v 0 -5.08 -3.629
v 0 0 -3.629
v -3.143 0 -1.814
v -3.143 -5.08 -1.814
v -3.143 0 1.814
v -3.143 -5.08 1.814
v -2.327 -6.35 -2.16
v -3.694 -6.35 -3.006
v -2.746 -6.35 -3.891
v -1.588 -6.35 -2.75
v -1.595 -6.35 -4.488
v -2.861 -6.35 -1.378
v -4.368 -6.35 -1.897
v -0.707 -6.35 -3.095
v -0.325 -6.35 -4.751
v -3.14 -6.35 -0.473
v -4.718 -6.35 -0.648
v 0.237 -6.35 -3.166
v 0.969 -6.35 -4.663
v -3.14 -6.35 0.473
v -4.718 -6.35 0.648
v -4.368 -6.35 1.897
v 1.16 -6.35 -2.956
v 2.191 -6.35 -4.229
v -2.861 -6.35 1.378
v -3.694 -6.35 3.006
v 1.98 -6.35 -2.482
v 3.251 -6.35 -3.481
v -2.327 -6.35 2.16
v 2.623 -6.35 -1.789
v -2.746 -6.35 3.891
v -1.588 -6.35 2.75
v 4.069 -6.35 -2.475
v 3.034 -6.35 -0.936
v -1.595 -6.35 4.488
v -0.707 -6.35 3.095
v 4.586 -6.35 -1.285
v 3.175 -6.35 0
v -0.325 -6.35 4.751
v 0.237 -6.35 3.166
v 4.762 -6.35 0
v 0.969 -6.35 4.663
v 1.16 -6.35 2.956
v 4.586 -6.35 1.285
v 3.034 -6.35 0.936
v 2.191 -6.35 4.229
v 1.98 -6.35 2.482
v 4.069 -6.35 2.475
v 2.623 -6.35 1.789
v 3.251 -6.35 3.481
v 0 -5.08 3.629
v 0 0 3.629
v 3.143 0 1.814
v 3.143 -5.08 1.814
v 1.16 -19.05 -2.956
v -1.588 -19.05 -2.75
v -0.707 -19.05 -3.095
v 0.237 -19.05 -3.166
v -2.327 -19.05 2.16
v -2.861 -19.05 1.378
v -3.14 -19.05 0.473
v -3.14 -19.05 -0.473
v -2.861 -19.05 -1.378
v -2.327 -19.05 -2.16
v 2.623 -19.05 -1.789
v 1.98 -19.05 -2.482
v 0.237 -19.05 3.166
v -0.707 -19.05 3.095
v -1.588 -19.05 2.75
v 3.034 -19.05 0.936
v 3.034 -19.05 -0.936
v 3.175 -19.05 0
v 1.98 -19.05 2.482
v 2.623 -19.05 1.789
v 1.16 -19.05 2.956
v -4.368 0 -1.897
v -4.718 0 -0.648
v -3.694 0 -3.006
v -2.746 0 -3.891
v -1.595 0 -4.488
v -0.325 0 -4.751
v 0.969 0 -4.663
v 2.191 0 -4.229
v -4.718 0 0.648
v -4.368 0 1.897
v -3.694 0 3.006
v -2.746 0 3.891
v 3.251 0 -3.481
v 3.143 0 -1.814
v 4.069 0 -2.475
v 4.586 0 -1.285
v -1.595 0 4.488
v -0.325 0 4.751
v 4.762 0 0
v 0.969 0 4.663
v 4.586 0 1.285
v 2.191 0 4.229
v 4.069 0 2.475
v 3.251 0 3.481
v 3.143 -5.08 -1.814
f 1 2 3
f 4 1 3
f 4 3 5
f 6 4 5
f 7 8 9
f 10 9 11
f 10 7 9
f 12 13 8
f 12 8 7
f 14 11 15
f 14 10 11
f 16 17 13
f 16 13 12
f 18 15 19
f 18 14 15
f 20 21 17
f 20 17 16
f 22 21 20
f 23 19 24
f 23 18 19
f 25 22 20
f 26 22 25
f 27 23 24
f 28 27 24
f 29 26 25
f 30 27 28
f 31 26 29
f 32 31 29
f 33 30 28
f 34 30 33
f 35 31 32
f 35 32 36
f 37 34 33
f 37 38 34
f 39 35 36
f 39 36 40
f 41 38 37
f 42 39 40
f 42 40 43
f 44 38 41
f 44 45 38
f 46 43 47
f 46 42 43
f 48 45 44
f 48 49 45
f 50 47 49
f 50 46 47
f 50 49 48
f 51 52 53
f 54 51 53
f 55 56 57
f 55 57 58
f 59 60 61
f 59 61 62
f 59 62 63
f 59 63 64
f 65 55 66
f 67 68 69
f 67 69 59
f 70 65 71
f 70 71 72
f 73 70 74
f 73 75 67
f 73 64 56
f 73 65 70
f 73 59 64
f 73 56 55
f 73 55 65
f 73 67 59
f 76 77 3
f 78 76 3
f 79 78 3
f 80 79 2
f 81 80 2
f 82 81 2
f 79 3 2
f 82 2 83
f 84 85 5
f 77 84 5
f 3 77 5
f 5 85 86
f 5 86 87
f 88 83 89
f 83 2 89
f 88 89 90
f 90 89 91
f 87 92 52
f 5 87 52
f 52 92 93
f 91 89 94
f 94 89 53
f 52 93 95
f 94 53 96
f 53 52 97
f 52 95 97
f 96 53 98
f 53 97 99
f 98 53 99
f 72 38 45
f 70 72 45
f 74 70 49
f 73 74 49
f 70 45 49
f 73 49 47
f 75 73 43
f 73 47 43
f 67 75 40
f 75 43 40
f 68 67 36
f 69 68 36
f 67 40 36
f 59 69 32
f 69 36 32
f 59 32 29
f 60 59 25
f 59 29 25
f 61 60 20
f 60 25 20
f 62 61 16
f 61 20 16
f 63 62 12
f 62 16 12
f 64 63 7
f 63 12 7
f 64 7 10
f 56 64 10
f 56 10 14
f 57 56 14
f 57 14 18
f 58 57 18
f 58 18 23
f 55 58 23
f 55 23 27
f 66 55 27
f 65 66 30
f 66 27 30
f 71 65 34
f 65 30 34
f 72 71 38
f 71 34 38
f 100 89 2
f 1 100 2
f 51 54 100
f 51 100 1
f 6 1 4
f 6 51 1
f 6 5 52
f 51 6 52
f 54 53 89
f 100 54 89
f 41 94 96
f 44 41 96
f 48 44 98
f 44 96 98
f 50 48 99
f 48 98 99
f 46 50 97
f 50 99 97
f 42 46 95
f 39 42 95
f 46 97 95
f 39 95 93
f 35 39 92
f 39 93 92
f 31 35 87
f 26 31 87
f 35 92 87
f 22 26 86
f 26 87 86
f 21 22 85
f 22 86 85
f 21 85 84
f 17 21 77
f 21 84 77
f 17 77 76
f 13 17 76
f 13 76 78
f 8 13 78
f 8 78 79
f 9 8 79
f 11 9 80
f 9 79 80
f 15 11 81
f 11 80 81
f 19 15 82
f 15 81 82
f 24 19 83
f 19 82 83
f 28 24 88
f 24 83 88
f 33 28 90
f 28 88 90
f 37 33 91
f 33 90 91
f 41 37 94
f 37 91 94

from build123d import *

# Parameters (mm, degrees)
F0_R     = 4.7625
F1_DEPTH = 6.35
F2_R     = 3.175
F3_DEPTH = 12.7
F5_DEPTH = 5.08


with BuildPart() as f1:
    # F0 (on Front) → F1 (new body)
    with BuildSketch(Plane.XZ):
        Circle(F0_R)
    extrude(amount=F1_DEPTH)

    # F2 (on face) → F3 (join)
    with BuildSketch(Plane.XZ.offset(6.35)):
        Circle(F2_R)
    extrude(amount=F3_DEPTH)

    # F4 (on face) → F5 (cut)
    with BuildSketch(Plane(origin=(0, 0, 0), x_dir=(-1, 0, 0), z_dir=(0, 1, 0))):
        Polygon((3.142612, -1.814388), (3.142612, 1.814388), (0, 3.628775), (-3.142612, 1.814388), (-3.142612, -1.814388), (0, -3.628775), align=None)
    extrude(amount=-F5_DEPTH, mode=Mode.SUBTRACT)


solid = f1.part
